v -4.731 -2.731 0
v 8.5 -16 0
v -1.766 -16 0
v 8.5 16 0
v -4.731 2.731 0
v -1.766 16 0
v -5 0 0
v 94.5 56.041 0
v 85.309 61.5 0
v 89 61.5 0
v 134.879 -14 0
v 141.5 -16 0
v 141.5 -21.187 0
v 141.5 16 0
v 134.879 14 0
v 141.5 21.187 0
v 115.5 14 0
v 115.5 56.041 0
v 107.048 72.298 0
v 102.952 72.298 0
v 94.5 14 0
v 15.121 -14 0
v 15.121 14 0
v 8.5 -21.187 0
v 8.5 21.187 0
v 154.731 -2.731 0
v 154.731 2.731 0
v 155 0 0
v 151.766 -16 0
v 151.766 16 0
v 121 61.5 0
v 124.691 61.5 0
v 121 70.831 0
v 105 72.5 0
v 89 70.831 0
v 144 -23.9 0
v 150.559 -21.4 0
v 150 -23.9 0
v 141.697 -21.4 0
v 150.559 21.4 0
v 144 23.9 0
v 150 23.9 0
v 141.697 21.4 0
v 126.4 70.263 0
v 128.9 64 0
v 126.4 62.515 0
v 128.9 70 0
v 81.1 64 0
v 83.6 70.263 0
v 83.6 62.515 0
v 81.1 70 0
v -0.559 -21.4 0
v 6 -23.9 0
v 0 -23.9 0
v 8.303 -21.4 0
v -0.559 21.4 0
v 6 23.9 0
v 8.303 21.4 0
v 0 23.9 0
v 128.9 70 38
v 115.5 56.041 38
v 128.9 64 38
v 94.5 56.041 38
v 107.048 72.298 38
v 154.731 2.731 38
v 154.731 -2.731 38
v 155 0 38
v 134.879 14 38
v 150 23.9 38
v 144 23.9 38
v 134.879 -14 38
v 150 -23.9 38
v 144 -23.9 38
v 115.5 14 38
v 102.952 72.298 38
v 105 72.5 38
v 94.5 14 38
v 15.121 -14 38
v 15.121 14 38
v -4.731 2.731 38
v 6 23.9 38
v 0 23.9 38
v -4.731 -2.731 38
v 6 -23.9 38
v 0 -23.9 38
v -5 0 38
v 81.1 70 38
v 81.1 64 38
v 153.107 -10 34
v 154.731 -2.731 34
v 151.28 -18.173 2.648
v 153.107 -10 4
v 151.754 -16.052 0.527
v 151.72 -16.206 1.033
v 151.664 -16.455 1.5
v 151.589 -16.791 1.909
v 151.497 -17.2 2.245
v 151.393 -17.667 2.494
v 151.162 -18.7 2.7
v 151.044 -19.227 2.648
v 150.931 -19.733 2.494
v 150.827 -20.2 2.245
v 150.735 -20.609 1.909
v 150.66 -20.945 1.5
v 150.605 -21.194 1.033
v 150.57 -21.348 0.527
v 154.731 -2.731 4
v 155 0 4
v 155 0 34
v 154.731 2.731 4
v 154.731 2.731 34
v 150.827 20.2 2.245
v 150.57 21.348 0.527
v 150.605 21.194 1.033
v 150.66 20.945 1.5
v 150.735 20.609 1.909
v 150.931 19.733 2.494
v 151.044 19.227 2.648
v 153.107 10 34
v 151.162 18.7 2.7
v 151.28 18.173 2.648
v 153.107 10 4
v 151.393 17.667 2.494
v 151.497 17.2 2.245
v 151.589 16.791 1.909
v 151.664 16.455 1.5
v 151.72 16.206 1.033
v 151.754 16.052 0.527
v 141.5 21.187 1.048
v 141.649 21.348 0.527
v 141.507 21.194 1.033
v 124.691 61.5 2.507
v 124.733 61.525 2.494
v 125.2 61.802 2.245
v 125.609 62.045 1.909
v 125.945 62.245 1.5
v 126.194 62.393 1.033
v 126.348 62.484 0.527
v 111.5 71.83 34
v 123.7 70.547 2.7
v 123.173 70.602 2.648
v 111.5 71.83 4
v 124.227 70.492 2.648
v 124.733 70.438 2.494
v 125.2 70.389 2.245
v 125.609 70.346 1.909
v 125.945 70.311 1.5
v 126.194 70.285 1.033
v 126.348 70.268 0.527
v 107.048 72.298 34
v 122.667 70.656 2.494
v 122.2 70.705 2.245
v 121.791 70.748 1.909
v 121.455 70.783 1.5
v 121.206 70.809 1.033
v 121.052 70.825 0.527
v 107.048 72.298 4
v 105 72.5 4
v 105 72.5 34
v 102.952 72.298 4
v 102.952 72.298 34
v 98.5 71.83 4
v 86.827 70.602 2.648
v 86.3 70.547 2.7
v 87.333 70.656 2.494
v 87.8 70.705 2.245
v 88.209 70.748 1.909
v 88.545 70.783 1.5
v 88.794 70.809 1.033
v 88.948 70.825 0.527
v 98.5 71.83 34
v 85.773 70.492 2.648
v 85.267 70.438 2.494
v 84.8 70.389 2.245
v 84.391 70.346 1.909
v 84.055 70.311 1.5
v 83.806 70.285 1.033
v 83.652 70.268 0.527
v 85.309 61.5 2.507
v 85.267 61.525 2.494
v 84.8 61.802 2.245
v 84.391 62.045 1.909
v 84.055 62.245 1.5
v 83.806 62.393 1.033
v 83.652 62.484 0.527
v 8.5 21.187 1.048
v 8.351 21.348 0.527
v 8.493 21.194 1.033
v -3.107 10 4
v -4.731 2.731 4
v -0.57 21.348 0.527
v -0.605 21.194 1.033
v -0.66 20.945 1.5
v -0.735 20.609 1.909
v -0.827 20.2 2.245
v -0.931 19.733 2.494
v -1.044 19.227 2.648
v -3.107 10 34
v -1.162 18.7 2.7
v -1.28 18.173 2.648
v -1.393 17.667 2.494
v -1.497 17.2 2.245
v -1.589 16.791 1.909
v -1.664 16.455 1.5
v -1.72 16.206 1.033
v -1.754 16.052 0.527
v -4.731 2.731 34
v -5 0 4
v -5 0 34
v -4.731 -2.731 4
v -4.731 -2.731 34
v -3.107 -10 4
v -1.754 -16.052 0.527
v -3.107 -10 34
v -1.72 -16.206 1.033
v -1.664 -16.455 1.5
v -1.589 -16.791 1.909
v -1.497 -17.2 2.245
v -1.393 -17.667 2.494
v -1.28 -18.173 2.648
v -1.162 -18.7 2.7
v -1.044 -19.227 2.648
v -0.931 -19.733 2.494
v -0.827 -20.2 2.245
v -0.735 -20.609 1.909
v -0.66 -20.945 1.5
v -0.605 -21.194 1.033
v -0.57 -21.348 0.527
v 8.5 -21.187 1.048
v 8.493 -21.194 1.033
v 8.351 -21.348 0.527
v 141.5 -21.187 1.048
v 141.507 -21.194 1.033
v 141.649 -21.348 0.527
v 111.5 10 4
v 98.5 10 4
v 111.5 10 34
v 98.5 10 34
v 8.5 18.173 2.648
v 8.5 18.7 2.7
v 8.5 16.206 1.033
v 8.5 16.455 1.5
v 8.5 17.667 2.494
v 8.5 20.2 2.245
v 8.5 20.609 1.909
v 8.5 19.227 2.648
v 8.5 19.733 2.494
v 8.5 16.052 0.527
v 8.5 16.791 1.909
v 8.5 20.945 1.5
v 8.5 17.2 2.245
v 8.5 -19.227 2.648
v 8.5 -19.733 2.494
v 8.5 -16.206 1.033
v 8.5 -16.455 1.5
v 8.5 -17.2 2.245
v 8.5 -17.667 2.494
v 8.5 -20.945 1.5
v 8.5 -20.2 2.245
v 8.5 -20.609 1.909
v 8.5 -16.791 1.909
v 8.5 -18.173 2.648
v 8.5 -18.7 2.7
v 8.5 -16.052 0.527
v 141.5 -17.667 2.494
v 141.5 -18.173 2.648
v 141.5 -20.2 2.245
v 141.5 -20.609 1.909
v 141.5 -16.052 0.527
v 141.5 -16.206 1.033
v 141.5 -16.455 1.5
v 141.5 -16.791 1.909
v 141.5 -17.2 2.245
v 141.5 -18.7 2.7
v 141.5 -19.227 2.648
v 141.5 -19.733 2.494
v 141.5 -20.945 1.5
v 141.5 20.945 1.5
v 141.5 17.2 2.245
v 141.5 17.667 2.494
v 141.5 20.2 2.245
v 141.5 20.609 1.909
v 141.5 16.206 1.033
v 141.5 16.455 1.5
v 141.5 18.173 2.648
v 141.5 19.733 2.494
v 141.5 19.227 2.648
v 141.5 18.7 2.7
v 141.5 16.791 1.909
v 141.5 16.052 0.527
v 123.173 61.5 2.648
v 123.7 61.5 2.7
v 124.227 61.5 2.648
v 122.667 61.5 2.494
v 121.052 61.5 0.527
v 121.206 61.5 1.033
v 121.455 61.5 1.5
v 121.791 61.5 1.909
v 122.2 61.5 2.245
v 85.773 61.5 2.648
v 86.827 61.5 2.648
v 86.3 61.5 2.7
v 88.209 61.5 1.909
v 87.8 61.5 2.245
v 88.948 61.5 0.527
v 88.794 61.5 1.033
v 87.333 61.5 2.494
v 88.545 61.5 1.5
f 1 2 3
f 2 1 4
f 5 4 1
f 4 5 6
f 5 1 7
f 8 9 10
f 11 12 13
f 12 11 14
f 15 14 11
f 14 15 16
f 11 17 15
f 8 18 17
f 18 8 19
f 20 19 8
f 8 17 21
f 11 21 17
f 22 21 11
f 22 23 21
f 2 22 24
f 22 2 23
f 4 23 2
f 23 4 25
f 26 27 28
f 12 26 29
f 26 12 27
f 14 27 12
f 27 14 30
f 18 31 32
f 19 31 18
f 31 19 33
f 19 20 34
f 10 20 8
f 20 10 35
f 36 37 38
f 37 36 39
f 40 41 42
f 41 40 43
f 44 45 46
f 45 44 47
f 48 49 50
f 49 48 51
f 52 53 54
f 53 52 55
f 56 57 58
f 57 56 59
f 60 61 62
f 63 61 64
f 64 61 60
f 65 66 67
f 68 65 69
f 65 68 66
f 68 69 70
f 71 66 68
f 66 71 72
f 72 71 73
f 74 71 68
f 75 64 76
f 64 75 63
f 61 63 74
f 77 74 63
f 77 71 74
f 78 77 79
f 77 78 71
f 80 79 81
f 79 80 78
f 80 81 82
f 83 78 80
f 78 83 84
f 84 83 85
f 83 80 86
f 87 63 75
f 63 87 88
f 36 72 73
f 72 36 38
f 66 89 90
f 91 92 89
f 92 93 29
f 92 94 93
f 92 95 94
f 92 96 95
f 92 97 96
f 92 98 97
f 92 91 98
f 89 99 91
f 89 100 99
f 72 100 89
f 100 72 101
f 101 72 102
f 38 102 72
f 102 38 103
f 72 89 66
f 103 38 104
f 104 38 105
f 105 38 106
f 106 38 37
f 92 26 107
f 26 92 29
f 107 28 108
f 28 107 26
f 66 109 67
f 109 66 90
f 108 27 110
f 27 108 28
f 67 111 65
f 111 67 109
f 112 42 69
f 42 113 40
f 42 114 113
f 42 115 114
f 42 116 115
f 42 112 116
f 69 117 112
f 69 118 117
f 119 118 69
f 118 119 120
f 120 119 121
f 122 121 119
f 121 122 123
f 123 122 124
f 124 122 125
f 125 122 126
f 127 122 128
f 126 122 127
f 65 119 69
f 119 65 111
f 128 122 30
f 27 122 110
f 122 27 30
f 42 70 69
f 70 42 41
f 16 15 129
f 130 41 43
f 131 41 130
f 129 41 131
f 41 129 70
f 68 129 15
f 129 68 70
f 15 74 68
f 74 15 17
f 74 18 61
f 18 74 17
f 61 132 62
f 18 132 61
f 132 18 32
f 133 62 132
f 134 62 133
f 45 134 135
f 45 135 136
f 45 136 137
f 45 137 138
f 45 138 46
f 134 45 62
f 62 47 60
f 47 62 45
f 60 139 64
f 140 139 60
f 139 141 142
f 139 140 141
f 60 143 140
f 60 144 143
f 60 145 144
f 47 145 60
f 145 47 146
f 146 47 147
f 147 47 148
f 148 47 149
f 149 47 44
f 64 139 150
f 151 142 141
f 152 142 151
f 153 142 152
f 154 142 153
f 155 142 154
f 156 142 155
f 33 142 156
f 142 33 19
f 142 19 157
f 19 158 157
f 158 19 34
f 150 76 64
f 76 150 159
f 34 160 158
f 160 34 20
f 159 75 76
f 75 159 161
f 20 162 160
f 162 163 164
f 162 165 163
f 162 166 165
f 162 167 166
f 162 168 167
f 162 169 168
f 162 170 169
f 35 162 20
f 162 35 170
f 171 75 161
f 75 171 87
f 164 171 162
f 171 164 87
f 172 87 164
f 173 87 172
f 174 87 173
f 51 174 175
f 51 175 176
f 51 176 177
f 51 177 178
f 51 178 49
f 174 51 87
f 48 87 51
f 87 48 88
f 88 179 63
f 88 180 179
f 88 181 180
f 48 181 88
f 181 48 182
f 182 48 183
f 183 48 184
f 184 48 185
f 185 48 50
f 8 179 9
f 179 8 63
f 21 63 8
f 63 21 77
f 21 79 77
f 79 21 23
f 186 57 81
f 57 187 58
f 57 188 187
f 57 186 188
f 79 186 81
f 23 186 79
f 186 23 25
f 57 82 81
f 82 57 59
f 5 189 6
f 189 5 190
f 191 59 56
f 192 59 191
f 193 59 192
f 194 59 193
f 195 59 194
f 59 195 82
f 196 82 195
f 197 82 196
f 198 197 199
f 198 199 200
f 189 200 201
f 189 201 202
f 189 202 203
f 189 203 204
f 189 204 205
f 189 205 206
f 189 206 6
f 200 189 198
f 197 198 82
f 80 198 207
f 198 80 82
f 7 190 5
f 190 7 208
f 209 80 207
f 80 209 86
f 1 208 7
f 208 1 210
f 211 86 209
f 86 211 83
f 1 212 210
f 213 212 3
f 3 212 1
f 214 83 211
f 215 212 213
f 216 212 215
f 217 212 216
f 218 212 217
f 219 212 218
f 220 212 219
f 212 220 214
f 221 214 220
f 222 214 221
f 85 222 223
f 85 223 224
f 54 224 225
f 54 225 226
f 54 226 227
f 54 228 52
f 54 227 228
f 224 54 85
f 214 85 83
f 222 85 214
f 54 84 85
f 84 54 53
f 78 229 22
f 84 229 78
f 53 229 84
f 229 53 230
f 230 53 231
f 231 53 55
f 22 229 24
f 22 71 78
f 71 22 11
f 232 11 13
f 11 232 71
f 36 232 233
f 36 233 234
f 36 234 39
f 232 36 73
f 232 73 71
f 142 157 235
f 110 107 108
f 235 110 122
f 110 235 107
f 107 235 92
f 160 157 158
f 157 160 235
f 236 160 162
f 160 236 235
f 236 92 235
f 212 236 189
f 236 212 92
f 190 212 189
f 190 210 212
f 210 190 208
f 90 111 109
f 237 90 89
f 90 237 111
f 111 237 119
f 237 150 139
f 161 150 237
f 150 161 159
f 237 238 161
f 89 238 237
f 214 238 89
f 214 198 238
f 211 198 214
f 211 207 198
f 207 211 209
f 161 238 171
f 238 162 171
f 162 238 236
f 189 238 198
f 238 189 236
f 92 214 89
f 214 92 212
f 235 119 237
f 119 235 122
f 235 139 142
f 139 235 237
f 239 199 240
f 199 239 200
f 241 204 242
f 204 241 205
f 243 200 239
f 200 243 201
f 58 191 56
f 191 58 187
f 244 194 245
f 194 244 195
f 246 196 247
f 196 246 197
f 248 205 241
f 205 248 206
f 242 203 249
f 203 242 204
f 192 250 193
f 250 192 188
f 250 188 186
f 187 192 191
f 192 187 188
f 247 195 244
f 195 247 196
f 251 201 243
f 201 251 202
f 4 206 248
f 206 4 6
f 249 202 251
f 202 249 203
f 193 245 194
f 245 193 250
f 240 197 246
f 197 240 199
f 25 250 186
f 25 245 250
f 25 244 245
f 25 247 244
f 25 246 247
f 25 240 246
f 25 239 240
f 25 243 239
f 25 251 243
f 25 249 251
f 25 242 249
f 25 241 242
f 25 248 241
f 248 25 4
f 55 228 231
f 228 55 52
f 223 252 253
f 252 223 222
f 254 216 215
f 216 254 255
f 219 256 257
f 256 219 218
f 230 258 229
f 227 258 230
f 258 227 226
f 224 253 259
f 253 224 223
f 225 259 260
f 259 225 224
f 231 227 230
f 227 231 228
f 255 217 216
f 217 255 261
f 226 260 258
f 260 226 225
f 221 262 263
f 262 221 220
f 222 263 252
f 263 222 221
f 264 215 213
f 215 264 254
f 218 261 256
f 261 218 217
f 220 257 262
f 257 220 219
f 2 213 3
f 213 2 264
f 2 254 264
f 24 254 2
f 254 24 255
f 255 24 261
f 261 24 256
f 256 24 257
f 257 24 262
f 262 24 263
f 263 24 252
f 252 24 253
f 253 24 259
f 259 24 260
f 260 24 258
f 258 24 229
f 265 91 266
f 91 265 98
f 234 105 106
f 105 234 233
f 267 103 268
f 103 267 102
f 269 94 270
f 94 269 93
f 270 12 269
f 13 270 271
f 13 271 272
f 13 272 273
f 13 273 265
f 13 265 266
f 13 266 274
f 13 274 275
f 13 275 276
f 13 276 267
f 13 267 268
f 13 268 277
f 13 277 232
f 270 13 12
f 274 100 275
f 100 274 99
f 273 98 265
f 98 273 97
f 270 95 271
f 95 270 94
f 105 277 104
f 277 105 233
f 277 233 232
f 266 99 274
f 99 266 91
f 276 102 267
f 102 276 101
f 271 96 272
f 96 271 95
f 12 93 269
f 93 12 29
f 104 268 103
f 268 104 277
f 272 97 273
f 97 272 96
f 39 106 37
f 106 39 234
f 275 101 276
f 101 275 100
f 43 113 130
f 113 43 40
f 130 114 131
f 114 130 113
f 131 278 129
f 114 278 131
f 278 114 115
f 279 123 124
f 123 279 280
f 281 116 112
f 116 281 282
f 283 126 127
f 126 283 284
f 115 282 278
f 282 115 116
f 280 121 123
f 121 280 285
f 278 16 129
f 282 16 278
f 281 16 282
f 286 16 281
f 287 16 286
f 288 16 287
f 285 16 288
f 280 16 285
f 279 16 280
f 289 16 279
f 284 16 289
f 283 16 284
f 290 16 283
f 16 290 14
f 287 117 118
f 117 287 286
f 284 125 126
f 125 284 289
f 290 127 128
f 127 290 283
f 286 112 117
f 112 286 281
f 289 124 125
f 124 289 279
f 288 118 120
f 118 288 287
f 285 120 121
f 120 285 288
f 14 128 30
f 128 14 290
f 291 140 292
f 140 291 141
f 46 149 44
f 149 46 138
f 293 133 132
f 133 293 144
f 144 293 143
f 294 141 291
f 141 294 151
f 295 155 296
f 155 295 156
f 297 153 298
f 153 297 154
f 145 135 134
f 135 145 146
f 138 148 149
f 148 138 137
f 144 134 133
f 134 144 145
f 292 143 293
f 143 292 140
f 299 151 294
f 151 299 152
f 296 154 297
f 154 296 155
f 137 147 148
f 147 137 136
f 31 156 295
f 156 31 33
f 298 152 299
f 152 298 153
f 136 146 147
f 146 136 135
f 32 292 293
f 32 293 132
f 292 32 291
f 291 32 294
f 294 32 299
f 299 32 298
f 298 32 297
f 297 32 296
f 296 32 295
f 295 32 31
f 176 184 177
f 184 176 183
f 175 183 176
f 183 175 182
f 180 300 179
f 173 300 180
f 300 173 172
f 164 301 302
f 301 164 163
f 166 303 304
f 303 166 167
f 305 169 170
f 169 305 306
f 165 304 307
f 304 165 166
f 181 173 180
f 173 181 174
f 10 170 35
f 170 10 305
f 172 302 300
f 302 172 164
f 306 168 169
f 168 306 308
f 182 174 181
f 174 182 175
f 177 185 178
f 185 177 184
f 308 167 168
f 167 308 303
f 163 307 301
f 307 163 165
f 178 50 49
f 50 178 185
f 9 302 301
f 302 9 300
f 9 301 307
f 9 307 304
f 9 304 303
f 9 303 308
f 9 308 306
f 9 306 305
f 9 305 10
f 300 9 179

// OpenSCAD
$fn = 32;

// ----------------------------------------------------------------------
// Air duct: 28 mm duct, 4 mm wall, 38 mm across
// ----------------------------------------------------------------------

// --- parameters (mm) ---
duct_r = 14;              // duct core radius
duct_d = 28;              // duct core diameter
wall = 4;                 // duct wall thickness
height = 38;              // duct width (extrusion height)
port_r = 23.9;            // port flange half width
port_d = 47.8;            // port flange width
port_t = 6;               // port flange thickness
bolt_d = 5.4;             // port bolt holes
bolt_offset = 18.7;       // bolt hole offset from the port axis
branch_r = 10.5;          // branch core radius
branch_d = 21;            // branch core diameter
branch_len = 70;          // branch length from the run axis

difference() {
  /* outer hull chain: tube with a flat flange plate at every port */
  linear_extrude(height = 38) {
    hull() {
      polygon([[0, -23.9], [0, 23.9], [6, 23.9], [6, -23.9]]);
      translate([9, 0]) circle(r = 14);
    }
    hull() {
      translate([9, 0]) circle(r = 14);
      translate([45, 0]) circle(r = 14);
    }
    hull() {
      translate([45, 0]) circle(r = 14);
      translate([105, 0]) circle(r = 14);
    }
    hull() {
      translate([105, 0]) circle(r = 14);
      translate([141, 0]) circle(r = 14);
    }
    hull() {
      translate([141, 0]) circle(r = 14);
      polygon([[150, 23.9], [150, -23.9], [144, -23.9], [144, 23.9]]);
    }
    hull() {
      translate([105, 0]) circle(r = 10.5);
      translate([105, 38.5]) circle(r = 10.5);
    }
    hull() {
      translate([105, 38.5]) circle(r = 10.5);
      translate([105, 62]) circle(r = 10.5);
    }
    hull() {
      translate([105, 62]) circle(r = 10.5);
      polygon([[81.1, 70], [128.9, 70], [128.9, 64], [81.1, 64]]);
    }
  }
  /* air passage: the same chain inset by the wall, 5 mm proud of the ports */
  translate([0, 0, 4]) linear_extrude(height = 30) {
    hull() {
      translate([-5, 0]) circle(r = 10);
      translate([45, 0]) circle(r = 10);
    }
    hull() {
      translate([45, 0]) circle(r = 10);
      translate([105, 0]) circle(r = 10);
    }
    hull() {
      translate([105, 0]) circle(r = 10);
      translate([155, 0]) circle(r = 10);
    }
    hull() {
      translate([105, 0]) circle(r = 6.5);
      translate([105, 38.5]) circle(r = 6.5);
    }
    hull() {
      translate([105, 38.5]) circle(r = 6.5);
      translate([105, 75]) circle(r = 6.5);
    }
  }
  translate([0, 0]) rotate([0, 0, -90]) translate([-18.7, -2.5]) rotate([-90, 0, 0]) cylinder(h = 11, d = 5.4);
  translate([0, 0]) rotate([0, 0, -90]) translate([18.7, -2.5]) rotate([-90, 0, 0]) cylinder(h = 11, d = 5.4);
  translate([150, 0]) rotate([0, 0, 90]) translate([-18.7, -2.5]) rotate([-90, 0, 0]) cylinder(h = 11, d = 5.4);
  translate([150, 0]) rotate([0, 0, 90]) translate([18.7, -2.5]) rotate([-90, 0, 0]) cylinder(h = 11, d = 5.4);
  translate([105, 70]) rotate([0, 0, 180]) translate([-18.7, -2.5]) rotate([-90, 0, 0]) cylinder(h = 11, d = 5.4);
  translate([105, 70]) rotate([0, 0, 180]) translate([18.7, -2.5]) rotate([-90, 0, 0]) cylinder(h = 11, d = 5.4);
}
